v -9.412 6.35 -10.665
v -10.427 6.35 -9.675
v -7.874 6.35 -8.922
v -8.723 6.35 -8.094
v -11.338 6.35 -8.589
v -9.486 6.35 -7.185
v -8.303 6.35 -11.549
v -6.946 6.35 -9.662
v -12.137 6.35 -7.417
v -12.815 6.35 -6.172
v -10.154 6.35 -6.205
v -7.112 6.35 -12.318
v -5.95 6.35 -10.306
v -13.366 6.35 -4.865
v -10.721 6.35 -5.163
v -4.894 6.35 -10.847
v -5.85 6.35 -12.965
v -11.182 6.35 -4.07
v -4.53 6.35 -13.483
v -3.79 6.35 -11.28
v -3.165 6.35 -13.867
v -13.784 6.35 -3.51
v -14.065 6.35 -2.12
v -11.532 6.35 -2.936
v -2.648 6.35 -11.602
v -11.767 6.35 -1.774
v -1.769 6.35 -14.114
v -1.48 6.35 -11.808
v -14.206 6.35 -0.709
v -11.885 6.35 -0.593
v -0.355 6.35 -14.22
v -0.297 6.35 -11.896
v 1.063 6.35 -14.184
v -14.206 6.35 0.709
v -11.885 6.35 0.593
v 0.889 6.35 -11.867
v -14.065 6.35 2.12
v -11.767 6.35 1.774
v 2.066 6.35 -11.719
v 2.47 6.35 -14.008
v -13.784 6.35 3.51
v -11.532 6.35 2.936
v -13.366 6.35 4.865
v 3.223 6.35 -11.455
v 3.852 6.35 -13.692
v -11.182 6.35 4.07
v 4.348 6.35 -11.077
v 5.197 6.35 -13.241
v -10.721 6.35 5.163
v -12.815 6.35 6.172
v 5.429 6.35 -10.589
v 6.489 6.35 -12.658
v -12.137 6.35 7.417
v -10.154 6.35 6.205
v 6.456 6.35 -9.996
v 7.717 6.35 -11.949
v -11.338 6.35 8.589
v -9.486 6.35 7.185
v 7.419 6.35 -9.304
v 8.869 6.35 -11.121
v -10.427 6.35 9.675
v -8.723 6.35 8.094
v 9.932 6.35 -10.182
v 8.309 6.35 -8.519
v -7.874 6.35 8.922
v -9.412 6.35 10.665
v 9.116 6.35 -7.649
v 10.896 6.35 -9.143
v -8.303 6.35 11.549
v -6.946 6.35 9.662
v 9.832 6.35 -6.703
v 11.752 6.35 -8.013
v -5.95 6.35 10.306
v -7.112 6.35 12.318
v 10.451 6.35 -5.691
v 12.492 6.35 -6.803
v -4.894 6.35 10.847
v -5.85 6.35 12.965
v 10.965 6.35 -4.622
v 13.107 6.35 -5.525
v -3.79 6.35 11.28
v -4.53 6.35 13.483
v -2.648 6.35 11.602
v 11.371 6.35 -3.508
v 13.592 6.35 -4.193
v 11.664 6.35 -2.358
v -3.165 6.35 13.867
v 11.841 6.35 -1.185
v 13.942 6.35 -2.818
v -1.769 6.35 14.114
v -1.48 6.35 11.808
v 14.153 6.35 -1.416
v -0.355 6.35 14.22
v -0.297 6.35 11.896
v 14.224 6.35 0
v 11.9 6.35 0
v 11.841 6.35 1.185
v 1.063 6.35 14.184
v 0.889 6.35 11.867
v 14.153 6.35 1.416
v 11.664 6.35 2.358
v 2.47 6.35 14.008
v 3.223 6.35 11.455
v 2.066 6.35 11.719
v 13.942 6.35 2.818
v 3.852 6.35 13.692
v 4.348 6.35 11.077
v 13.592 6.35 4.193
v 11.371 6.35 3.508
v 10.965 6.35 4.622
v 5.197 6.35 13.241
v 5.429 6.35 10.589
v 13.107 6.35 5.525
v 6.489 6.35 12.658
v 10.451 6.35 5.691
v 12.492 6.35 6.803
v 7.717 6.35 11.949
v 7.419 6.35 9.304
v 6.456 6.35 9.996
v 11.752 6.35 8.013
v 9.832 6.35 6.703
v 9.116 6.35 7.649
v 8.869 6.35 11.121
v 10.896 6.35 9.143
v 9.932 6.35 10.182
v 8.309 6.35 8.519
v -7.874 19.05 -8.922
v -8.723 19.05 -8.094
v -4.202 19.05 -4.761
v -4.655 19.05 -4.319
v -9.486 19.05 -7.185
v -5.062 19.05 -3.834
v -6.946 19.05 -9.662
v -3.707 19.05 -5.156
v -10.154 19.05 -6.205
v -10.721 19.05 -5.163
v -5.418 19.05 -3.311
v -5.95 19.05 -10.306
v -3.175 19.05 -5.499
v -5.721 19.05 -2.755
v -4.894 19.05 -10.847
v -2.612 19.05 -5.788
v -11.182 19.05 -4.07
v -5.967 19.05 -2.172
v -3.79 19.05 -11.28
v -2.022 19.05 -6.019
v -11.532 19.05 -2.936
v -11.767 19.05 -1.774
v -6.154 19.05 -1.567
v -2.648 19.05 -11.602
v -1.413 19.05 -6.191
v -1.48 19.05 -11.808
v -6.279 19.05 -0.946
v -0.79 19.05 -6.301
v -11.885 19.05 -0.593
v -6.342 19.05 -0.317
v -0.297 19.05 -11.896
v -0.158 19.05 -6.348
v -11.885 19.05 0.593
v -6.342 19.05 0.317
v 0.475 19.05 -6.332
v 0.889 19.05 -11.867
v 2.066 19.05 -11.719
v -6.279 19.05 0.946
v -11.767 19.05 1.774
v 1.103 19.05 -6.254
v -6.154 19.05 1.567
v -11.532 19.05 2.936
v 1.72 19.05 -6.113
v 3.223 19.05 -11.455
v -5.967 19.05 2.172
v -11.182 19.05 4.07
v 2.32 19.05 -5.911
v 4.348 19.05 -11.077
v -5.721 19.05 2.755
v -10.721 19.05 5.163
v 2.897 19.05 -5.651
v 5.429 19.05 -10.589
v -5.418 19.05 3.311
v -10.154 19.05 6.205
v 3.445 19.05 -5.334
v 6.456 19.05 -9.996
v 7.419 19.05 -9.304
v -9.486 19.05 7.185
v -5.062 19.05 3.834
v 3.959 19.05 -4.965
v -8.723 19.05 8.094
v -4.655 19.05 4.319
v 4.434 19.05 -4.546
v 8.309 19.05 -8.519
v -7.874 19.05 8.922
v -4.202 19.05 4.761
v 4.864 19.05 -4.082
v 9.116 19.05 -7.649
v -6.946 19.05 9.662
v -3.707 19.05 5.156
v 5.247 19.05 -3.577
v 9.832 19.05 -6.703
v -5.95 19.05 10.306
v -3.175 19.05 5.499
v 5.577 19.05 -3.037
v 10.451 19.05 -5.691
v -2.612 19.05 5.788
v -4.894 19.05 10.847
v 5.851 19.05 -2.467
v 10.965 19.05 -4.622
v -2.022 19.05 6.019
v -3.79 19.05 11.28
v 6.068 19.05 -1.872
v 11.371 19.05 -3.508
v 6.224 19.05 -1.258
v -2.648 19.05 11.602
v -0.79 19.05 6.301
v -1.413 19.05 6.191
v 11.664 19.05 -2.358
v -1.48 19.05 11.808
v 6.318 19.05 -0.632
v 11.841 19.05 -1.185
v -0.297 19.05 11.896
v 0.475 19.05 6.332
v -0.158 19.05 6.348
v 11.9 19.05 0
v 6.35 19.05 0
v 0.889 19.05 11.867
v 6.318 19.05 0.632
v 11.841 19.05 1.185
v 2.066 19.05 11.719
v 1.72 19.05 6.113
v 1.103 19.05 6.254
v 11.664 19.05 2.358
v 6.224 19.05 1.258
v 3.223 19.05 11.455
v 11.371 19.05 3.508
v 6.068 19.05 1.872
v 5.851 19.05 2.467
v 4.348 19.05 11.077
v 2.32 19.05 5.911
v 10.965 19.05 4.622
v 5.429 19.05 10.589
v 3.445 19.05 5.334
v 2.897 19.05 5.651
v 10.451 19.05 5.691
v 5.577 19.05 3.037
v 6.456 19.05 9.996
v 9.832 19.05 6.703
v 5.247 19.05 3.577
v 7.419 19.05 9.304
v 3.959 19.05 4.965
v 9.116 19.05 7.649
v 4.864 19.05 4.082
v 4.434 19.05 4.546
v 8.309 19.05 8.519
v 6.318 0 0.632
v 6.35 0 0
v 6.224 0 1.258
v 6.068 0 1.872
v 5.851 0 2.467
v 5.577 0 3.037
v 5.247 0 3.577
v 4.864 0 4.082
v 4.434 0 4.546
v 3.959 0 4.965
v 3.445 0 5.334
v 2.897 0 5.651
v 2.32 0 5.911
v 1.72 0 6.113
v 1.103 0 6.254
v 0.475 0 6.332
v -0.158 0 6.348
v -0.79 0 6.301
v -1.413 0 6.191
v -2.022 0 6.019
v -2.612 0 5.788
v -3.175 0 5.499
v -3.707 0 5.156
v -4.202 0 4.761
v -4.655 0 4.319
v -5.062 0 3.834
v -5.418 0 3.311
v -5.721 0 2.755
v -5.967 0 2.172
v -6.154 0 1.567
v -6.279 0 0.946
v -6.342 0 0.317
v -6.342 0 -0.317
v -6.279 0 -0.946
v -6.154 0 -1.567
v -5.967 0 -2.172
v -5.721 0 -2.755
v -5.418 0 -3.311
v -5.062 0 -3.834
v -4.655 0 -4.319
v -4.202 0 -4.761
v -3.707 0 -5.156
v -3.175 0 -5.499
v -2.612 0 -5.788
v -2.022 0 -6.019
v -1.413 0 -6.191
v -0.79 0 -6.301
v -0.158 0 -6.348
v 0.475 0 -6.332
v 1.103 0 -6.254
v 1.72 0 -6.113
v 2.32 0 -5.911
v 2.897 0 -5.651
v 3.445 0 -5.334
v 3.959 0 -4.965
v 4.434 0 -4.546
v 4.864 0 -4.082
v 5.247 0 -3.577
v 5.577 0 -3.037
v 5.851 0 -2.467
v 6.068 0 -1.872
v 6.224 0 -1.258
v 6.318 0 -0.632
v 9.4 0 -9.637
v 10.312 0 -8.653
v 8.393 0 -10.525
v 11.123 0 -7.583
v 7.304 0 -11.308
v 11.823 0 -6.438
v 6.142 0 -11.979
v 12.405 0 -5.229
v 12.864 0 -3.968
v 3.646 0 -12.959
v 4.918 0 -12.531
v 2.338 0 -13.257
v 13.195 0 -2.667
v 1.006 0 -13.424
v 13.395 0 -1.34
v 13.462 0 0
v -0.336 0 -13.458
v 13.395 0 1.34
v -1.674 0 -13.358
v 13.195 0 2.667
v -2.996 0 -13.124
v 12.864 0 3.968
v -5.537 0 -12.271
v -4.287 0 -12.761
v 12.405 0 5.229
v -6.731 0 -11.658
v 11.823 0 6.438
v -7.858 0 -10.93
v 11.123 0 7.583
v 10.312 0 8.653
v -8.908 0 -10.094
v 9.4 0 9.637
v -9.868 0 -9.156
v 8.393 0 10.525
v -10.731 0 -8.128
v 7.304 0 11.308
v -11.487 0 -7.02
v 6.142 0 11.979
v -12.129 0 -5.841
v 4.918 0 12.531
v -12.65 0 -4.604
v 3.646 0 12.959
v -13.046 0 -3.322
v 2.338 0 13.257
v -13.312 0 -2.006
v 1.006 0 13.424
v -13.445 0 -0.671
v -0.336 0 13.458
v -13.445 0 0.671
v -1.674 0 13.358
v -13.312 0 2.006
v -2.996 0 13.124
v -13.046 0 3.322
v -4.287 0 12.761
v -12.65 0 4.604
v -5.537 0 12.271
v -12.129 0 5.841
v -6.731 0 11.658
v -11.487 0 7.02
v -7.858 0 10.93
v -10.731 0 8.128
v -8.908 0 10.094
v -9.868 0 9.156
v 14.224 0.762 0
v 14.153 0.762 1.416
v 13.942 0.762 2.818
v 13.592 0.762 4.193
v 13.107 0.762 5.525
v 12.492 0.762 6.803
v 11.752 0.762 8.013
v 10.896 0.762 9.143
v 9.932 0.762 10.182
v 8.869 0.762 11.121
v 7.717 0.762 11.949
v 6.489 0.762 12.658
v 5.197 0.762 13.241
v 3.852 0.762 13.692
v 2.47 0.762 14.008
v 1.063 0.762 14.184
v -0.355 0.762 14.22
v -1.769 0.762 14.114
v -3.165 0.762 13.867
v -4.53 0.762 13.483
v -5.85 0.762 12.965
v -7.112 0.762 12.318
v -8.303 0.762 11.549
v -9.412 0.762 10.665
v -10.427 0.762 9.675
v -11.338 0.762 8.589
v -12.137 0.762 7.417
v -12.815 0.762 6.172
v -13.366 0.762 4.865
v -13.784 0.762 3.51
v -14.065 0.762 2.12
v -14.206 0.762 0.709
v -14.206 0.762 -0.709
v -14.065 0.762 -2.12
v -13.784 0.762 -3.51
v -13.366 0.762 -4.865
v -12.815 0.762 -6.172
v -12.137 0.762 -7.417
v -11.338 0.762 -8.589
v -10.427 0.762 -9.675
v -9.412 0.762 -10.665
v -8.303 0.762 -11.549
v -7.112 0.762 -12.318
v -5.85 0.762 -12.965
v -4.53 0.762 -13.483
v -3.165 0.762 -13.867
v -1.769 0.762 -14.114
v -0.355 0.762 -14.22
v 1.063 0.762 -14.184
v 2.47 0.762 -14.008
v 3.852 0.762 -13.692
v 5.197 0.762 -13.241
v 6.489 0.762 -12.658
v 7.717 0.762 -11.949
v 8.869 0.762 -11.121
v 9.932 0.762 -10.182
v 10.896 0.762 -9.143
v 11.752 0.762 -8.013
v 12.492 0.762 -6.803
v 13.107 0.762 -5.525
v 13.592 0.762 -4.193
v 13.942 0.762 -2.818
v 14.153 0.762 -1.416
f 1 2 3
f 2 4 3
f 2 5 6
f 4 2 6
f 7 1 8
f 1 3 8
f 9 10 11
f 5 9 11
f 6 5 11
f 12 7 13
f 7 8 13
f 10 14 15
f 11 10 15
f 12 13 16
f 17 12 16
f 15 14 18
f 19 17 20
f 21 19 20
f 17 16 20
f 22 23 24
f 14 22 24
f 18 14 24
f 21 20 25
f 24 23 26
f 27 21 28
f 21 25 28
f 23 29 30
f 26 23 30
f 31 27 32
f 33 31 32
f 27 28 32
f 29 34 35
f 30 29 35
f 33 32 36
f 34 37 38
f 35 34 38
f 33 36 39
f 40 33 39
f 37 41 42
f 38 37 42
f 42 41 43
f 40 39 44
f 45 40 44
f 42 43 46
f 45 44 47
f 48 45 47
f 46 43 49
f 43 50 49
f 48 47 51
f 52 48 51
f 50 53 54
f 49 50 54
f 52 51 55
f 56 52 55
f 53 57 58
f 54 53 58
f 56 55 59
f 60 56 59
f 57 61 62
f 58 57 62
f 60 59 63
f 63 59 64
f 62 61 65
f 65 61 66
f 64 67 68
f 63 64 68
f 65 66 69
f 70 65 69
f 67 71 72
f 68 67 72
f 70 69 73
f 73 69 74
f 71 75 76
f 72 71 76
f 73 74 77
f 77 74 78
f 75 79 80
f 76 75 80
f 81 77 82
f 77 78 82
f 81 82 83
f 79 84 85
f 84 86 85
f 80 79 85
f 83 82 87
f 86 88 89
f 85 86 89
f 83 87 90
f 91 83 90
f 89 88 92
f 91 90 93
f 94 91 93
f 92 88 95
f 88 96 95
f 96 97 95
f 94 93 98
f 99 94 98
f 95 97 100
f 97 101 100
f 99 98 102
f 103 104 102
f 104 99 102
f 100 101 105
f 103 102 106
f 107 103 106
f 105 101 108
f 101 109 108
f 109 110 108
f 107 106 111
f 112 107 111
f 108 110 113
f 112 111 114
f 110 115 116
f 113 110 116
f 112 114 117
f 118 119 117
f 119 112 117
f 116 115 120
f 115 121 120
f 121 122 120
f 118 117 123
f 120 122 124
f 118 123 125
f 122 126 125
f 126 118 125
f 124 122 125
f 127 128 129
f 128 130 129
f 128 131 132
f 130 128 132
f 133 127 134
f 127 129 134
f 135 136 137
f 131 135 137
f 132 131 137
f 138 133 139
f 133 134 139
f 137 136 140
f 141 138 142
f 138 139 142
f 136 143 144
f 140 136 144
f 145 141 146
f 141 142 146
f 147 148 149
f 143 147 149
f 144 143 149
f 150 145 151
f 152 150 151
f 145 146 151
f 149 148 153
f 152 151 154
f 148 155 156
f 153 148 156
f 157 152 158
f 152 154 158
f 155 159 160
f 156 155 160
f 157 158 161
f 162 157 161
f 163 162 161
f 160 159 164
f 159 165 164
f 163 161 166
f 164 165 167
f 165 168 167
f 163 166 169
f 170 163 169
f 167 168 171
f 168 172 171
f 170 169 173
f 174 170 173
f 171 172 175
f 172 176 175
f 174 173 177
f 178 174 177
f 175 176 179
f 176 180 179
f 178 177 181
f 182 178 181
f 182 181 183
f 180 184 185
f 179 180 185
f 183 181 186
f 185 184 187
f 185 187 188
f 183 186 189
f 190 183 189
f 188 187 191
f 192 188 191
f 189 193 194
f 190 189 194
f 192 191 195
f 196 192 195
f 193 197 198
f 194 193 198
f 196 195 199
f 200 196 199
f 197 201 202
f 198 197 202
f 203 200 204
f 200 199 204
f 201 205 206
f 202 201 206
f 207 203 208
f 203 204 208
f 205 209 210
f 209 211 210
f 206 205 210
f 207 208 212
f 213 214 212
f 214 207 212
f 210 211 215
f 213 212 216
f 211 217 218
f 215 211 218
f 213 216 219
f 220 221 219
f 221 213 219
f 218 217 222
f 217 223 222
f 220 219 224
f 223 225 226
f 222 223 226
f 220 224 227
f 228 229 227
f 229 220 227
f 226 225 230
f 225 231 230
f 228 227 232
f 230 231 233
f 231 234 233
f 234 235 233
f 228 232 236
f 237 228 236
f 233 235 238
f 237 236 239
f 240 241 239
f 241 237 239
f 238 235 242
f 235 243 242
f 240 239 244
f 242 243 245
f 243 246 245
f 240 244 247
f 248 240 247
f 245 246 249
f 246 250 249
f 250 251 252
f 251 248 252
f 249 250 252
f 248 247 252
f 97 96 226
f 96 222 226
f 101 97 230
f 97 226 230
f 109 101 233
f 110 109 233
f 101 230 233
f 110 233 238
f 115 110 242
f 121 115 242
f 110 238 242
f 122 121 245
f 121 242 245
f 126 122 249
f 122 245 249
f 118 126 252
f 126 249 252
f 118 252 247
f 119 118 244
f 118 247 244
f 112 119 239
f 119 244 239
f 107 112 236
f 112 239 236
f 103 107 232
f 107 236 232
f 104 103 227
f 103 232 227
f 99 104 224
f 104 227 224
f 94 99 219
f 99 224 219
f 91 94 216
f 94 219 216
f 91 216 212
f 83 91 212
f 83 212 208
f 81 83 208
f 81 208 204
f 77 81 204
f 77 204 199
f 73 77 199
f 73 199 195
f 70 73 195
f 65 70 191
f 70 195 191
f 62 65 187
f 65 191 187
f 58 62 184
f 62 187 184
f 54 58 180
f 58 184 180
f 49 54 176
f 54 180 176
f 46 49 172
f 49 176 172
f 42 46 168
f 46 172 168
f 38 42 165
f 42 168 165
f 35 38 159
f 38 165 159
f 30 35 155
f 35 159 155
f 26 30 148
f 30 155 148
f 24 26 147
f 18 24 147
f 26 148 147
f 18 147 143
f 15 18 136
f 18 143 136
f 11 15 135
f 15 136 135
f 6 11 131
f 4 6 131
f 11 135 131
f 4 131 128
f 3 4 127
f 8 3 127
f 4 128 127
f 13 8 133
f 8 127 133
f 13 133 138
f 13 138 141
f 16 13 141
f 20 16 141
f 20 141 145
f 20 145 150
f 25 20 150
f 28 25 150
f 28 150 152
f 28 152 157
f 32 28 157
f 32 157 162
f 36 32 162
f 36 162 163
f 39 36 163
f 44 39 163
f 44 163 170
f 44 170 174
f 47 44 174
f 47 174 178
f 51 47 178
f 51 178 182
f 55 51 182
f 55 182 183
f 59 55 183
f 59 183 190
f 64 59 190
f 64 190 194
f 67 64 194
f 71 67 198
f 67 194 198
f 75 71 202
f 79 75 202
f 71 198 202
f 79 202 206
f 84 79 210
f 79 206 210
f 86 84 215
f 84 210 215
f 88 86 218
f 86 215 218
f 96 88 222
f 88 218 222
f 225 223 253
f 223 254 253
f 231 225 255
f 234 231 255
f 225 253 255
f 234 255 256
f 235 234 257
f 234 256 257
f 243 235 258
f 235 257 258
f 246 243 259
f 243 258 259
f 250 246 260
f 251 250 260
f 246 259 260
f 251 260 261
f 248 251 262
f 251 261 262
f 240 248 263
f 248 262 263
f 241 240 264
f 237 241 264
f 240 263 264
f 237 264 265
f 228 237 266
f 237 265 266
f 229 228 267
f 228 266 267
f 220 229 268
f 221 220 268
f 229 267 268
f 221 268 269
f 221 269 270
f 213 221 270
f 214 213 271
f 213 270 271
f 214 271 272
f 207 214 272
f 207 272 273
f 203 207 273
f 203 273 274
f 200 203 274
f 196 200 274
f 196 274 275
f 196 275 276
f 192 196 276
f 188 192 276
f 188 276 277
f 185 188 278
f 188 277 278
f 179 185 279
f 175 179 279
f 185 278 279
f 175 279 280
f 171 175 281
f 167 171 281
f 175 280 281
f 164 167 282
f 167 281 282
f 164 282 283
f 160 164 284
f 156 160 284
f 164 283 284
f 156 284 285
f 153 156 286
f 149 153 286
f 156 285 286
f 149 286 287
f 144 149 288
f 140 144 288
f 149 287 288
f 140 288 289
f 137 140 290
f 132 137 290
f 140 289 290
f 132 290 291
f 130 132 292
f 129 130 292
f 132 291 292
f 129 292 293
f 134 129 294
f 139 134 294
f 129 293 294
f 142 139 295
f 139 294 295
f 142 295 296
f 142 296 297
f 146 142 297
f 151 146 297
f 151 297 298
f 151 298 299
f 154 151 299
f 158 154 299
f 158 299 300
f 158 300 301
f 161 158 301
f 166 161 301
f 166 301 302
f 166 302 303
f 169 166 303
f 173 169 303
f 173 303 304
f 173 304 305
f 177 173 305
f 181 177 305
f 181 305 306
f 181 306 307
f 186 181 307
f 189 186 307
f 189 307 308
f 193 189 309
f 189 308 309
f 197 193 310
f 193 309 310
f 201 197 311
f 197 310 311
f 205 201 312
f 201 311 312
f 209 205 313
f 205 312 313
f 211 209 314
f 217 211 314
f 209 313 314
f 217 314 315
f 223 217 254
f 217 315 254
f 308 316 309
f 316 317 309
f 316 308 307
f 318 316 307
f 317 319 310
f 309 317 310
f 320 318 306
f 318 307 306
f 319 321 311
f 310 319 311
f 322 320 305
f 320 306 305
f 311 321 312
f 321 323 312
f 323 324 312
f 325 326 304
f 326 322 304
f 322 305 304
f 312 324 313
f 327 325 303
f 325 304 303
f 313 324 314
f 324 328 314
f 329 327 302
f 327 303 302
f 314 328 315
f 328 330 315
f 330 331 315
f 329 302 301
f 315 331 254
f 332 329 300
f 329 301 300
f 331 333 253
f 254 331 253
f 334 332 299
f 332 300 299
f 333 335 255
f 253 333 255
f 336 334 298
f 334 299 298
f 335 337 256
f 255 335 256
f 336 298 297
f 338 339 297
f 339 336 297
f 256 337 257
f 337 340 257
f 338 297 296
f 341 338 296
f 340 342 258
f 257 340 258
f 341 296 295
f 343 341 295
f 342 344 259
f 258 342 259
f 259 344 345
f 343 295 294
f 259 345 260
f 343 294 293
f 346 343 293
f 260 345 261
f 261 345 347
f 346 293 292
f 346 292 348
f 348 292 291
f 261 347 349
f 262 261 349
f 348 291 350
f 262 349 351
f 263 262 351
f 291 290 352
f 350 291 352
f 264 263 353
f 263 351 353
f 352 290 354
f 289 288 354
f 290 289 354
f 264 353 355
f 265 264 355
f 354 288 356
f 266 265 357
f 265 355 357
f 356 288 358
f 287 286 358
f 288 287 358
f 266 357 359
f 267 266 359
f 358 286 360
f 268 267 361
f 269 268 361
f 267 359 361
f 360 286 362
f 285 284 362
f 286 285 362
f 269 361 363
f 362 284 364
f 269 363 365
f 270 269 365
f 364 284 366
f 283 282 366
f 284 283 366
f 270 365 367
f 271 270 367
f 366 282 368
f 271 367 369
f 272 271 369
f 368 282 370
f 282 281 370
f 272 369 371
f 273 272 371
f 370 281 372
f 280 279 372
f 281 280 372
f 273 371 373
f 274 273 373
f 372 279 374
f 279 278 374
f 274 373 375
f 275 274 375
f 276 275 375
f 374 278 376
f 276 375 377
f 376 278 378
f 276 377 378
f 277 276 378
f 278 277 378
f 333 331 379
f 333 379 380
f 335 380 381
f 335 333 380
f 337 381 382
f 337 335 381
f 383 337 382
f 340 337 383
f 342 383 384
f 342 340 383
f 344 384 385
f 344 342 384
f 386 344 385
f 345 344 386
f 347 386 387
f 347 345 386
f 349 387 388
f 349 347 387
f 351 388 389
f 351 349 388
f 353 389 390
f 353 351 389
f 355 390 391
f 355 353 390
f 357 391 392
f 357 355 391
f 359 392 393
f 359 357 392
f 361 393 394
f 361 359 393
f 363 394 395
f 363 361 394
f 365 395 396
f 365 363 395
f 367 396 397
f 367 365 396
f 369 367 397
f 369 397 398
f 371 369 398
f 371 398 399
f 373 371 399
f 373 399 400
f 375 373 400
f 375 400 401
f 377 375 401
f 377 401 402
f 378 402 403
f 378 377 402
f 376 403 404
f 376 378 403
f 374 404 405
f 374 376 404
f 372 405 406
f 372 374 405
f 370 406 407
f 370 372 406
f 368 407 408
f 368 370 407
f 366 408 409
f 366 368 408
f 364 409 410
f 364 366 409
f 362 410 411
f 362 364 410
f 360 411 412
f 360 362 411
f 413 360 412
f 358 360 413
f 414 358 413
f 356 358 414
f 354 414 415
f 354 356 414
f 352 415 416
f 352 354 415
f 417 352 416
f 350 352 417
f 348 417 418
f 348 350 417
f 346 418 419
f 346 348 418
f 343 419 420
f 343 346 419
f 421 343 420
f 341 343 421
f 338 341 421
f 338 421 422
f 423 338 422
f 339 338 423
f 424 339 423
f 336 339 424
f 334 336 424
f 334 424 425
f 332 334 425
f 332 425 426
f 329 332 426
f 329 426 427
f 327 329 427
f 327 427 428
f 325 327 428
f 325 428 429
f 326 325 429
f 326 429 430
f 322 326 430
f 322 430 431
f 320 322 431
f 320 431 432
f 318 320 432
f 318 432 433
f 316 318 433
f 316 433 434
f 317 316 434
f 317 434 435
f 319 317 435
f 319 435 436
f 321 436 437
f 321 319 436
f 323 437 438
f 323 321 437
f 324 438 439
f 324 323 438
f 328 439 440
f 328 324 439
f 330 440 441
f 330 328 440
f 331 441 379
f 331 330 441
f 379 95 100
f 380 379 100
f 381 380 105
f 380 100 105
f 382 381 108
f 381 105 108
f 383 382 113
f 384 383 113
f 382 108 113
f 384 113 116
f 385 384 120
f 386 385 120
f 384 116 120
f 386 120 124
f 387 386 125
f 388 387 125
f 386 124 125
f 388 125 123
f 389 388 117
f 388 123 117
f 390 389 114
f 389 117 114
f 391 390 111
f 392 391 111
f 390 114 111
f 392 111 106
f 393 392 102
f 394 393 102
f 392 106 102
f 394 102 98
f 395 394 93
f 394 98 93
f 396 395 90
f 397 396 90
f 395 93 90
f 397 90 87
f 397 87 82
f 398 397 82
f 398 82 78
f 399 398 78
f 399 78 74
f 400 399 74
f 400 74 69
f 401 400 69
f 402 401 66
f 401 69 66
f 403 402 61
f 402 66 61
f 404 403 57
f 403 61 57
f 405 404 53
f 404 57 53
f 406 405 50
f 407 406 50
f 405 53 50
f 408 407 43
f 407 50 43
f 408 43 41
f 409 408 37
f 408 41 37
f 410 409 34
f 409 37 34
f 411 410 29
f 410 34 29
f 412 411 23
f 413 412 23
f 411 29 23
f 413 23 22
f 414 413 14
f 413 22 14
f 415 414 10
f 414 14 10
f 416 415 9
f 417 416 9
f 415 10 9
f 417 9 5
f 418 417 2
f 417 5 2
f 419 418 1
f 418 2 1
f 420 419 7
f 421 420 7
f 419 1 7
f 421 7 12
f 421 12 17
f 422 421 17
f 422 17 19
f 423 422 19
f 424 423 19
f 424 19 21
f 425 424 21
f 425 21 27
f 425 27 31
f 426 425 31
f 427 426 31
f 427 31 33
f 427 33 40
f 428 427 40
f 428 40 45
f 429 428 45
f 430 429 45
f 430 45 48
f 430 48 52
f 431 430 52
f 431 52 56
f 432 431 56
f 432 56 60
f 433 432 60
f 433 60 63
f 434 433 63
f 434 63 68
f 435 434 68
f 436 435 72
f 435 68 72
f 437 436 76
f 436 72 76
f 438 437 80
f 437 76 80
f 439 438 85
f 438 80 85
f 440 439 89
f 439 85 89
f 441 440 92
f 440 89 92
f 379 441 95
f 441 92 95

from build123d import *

# Parameters (mm, degrees)
CHAMFER1_SIZE = 0.762


with BuildPart() as part:
    # Sketch2 → Revolve1 (revolve)
    with BuildSketch(Plane.XY):
        Polygon((14.224, 0), (14.224, 6.35), (11.8999, 6.35), (11.8999, 19.05), (6.35, 19.05), (6.35, 0), align=None)
    revolve(axis=Axis((0, 0, 0), (0, -1, 0)))

    # Chamfer1
    chamfer1_edges = [part.edges().sort_by_distance(p)[0] for p in [
        (-14.224, 0, 0),
    ]]
    chamfer(chamfer1_edges, length=CHAMFER1_SIZE)


solid = part.part
